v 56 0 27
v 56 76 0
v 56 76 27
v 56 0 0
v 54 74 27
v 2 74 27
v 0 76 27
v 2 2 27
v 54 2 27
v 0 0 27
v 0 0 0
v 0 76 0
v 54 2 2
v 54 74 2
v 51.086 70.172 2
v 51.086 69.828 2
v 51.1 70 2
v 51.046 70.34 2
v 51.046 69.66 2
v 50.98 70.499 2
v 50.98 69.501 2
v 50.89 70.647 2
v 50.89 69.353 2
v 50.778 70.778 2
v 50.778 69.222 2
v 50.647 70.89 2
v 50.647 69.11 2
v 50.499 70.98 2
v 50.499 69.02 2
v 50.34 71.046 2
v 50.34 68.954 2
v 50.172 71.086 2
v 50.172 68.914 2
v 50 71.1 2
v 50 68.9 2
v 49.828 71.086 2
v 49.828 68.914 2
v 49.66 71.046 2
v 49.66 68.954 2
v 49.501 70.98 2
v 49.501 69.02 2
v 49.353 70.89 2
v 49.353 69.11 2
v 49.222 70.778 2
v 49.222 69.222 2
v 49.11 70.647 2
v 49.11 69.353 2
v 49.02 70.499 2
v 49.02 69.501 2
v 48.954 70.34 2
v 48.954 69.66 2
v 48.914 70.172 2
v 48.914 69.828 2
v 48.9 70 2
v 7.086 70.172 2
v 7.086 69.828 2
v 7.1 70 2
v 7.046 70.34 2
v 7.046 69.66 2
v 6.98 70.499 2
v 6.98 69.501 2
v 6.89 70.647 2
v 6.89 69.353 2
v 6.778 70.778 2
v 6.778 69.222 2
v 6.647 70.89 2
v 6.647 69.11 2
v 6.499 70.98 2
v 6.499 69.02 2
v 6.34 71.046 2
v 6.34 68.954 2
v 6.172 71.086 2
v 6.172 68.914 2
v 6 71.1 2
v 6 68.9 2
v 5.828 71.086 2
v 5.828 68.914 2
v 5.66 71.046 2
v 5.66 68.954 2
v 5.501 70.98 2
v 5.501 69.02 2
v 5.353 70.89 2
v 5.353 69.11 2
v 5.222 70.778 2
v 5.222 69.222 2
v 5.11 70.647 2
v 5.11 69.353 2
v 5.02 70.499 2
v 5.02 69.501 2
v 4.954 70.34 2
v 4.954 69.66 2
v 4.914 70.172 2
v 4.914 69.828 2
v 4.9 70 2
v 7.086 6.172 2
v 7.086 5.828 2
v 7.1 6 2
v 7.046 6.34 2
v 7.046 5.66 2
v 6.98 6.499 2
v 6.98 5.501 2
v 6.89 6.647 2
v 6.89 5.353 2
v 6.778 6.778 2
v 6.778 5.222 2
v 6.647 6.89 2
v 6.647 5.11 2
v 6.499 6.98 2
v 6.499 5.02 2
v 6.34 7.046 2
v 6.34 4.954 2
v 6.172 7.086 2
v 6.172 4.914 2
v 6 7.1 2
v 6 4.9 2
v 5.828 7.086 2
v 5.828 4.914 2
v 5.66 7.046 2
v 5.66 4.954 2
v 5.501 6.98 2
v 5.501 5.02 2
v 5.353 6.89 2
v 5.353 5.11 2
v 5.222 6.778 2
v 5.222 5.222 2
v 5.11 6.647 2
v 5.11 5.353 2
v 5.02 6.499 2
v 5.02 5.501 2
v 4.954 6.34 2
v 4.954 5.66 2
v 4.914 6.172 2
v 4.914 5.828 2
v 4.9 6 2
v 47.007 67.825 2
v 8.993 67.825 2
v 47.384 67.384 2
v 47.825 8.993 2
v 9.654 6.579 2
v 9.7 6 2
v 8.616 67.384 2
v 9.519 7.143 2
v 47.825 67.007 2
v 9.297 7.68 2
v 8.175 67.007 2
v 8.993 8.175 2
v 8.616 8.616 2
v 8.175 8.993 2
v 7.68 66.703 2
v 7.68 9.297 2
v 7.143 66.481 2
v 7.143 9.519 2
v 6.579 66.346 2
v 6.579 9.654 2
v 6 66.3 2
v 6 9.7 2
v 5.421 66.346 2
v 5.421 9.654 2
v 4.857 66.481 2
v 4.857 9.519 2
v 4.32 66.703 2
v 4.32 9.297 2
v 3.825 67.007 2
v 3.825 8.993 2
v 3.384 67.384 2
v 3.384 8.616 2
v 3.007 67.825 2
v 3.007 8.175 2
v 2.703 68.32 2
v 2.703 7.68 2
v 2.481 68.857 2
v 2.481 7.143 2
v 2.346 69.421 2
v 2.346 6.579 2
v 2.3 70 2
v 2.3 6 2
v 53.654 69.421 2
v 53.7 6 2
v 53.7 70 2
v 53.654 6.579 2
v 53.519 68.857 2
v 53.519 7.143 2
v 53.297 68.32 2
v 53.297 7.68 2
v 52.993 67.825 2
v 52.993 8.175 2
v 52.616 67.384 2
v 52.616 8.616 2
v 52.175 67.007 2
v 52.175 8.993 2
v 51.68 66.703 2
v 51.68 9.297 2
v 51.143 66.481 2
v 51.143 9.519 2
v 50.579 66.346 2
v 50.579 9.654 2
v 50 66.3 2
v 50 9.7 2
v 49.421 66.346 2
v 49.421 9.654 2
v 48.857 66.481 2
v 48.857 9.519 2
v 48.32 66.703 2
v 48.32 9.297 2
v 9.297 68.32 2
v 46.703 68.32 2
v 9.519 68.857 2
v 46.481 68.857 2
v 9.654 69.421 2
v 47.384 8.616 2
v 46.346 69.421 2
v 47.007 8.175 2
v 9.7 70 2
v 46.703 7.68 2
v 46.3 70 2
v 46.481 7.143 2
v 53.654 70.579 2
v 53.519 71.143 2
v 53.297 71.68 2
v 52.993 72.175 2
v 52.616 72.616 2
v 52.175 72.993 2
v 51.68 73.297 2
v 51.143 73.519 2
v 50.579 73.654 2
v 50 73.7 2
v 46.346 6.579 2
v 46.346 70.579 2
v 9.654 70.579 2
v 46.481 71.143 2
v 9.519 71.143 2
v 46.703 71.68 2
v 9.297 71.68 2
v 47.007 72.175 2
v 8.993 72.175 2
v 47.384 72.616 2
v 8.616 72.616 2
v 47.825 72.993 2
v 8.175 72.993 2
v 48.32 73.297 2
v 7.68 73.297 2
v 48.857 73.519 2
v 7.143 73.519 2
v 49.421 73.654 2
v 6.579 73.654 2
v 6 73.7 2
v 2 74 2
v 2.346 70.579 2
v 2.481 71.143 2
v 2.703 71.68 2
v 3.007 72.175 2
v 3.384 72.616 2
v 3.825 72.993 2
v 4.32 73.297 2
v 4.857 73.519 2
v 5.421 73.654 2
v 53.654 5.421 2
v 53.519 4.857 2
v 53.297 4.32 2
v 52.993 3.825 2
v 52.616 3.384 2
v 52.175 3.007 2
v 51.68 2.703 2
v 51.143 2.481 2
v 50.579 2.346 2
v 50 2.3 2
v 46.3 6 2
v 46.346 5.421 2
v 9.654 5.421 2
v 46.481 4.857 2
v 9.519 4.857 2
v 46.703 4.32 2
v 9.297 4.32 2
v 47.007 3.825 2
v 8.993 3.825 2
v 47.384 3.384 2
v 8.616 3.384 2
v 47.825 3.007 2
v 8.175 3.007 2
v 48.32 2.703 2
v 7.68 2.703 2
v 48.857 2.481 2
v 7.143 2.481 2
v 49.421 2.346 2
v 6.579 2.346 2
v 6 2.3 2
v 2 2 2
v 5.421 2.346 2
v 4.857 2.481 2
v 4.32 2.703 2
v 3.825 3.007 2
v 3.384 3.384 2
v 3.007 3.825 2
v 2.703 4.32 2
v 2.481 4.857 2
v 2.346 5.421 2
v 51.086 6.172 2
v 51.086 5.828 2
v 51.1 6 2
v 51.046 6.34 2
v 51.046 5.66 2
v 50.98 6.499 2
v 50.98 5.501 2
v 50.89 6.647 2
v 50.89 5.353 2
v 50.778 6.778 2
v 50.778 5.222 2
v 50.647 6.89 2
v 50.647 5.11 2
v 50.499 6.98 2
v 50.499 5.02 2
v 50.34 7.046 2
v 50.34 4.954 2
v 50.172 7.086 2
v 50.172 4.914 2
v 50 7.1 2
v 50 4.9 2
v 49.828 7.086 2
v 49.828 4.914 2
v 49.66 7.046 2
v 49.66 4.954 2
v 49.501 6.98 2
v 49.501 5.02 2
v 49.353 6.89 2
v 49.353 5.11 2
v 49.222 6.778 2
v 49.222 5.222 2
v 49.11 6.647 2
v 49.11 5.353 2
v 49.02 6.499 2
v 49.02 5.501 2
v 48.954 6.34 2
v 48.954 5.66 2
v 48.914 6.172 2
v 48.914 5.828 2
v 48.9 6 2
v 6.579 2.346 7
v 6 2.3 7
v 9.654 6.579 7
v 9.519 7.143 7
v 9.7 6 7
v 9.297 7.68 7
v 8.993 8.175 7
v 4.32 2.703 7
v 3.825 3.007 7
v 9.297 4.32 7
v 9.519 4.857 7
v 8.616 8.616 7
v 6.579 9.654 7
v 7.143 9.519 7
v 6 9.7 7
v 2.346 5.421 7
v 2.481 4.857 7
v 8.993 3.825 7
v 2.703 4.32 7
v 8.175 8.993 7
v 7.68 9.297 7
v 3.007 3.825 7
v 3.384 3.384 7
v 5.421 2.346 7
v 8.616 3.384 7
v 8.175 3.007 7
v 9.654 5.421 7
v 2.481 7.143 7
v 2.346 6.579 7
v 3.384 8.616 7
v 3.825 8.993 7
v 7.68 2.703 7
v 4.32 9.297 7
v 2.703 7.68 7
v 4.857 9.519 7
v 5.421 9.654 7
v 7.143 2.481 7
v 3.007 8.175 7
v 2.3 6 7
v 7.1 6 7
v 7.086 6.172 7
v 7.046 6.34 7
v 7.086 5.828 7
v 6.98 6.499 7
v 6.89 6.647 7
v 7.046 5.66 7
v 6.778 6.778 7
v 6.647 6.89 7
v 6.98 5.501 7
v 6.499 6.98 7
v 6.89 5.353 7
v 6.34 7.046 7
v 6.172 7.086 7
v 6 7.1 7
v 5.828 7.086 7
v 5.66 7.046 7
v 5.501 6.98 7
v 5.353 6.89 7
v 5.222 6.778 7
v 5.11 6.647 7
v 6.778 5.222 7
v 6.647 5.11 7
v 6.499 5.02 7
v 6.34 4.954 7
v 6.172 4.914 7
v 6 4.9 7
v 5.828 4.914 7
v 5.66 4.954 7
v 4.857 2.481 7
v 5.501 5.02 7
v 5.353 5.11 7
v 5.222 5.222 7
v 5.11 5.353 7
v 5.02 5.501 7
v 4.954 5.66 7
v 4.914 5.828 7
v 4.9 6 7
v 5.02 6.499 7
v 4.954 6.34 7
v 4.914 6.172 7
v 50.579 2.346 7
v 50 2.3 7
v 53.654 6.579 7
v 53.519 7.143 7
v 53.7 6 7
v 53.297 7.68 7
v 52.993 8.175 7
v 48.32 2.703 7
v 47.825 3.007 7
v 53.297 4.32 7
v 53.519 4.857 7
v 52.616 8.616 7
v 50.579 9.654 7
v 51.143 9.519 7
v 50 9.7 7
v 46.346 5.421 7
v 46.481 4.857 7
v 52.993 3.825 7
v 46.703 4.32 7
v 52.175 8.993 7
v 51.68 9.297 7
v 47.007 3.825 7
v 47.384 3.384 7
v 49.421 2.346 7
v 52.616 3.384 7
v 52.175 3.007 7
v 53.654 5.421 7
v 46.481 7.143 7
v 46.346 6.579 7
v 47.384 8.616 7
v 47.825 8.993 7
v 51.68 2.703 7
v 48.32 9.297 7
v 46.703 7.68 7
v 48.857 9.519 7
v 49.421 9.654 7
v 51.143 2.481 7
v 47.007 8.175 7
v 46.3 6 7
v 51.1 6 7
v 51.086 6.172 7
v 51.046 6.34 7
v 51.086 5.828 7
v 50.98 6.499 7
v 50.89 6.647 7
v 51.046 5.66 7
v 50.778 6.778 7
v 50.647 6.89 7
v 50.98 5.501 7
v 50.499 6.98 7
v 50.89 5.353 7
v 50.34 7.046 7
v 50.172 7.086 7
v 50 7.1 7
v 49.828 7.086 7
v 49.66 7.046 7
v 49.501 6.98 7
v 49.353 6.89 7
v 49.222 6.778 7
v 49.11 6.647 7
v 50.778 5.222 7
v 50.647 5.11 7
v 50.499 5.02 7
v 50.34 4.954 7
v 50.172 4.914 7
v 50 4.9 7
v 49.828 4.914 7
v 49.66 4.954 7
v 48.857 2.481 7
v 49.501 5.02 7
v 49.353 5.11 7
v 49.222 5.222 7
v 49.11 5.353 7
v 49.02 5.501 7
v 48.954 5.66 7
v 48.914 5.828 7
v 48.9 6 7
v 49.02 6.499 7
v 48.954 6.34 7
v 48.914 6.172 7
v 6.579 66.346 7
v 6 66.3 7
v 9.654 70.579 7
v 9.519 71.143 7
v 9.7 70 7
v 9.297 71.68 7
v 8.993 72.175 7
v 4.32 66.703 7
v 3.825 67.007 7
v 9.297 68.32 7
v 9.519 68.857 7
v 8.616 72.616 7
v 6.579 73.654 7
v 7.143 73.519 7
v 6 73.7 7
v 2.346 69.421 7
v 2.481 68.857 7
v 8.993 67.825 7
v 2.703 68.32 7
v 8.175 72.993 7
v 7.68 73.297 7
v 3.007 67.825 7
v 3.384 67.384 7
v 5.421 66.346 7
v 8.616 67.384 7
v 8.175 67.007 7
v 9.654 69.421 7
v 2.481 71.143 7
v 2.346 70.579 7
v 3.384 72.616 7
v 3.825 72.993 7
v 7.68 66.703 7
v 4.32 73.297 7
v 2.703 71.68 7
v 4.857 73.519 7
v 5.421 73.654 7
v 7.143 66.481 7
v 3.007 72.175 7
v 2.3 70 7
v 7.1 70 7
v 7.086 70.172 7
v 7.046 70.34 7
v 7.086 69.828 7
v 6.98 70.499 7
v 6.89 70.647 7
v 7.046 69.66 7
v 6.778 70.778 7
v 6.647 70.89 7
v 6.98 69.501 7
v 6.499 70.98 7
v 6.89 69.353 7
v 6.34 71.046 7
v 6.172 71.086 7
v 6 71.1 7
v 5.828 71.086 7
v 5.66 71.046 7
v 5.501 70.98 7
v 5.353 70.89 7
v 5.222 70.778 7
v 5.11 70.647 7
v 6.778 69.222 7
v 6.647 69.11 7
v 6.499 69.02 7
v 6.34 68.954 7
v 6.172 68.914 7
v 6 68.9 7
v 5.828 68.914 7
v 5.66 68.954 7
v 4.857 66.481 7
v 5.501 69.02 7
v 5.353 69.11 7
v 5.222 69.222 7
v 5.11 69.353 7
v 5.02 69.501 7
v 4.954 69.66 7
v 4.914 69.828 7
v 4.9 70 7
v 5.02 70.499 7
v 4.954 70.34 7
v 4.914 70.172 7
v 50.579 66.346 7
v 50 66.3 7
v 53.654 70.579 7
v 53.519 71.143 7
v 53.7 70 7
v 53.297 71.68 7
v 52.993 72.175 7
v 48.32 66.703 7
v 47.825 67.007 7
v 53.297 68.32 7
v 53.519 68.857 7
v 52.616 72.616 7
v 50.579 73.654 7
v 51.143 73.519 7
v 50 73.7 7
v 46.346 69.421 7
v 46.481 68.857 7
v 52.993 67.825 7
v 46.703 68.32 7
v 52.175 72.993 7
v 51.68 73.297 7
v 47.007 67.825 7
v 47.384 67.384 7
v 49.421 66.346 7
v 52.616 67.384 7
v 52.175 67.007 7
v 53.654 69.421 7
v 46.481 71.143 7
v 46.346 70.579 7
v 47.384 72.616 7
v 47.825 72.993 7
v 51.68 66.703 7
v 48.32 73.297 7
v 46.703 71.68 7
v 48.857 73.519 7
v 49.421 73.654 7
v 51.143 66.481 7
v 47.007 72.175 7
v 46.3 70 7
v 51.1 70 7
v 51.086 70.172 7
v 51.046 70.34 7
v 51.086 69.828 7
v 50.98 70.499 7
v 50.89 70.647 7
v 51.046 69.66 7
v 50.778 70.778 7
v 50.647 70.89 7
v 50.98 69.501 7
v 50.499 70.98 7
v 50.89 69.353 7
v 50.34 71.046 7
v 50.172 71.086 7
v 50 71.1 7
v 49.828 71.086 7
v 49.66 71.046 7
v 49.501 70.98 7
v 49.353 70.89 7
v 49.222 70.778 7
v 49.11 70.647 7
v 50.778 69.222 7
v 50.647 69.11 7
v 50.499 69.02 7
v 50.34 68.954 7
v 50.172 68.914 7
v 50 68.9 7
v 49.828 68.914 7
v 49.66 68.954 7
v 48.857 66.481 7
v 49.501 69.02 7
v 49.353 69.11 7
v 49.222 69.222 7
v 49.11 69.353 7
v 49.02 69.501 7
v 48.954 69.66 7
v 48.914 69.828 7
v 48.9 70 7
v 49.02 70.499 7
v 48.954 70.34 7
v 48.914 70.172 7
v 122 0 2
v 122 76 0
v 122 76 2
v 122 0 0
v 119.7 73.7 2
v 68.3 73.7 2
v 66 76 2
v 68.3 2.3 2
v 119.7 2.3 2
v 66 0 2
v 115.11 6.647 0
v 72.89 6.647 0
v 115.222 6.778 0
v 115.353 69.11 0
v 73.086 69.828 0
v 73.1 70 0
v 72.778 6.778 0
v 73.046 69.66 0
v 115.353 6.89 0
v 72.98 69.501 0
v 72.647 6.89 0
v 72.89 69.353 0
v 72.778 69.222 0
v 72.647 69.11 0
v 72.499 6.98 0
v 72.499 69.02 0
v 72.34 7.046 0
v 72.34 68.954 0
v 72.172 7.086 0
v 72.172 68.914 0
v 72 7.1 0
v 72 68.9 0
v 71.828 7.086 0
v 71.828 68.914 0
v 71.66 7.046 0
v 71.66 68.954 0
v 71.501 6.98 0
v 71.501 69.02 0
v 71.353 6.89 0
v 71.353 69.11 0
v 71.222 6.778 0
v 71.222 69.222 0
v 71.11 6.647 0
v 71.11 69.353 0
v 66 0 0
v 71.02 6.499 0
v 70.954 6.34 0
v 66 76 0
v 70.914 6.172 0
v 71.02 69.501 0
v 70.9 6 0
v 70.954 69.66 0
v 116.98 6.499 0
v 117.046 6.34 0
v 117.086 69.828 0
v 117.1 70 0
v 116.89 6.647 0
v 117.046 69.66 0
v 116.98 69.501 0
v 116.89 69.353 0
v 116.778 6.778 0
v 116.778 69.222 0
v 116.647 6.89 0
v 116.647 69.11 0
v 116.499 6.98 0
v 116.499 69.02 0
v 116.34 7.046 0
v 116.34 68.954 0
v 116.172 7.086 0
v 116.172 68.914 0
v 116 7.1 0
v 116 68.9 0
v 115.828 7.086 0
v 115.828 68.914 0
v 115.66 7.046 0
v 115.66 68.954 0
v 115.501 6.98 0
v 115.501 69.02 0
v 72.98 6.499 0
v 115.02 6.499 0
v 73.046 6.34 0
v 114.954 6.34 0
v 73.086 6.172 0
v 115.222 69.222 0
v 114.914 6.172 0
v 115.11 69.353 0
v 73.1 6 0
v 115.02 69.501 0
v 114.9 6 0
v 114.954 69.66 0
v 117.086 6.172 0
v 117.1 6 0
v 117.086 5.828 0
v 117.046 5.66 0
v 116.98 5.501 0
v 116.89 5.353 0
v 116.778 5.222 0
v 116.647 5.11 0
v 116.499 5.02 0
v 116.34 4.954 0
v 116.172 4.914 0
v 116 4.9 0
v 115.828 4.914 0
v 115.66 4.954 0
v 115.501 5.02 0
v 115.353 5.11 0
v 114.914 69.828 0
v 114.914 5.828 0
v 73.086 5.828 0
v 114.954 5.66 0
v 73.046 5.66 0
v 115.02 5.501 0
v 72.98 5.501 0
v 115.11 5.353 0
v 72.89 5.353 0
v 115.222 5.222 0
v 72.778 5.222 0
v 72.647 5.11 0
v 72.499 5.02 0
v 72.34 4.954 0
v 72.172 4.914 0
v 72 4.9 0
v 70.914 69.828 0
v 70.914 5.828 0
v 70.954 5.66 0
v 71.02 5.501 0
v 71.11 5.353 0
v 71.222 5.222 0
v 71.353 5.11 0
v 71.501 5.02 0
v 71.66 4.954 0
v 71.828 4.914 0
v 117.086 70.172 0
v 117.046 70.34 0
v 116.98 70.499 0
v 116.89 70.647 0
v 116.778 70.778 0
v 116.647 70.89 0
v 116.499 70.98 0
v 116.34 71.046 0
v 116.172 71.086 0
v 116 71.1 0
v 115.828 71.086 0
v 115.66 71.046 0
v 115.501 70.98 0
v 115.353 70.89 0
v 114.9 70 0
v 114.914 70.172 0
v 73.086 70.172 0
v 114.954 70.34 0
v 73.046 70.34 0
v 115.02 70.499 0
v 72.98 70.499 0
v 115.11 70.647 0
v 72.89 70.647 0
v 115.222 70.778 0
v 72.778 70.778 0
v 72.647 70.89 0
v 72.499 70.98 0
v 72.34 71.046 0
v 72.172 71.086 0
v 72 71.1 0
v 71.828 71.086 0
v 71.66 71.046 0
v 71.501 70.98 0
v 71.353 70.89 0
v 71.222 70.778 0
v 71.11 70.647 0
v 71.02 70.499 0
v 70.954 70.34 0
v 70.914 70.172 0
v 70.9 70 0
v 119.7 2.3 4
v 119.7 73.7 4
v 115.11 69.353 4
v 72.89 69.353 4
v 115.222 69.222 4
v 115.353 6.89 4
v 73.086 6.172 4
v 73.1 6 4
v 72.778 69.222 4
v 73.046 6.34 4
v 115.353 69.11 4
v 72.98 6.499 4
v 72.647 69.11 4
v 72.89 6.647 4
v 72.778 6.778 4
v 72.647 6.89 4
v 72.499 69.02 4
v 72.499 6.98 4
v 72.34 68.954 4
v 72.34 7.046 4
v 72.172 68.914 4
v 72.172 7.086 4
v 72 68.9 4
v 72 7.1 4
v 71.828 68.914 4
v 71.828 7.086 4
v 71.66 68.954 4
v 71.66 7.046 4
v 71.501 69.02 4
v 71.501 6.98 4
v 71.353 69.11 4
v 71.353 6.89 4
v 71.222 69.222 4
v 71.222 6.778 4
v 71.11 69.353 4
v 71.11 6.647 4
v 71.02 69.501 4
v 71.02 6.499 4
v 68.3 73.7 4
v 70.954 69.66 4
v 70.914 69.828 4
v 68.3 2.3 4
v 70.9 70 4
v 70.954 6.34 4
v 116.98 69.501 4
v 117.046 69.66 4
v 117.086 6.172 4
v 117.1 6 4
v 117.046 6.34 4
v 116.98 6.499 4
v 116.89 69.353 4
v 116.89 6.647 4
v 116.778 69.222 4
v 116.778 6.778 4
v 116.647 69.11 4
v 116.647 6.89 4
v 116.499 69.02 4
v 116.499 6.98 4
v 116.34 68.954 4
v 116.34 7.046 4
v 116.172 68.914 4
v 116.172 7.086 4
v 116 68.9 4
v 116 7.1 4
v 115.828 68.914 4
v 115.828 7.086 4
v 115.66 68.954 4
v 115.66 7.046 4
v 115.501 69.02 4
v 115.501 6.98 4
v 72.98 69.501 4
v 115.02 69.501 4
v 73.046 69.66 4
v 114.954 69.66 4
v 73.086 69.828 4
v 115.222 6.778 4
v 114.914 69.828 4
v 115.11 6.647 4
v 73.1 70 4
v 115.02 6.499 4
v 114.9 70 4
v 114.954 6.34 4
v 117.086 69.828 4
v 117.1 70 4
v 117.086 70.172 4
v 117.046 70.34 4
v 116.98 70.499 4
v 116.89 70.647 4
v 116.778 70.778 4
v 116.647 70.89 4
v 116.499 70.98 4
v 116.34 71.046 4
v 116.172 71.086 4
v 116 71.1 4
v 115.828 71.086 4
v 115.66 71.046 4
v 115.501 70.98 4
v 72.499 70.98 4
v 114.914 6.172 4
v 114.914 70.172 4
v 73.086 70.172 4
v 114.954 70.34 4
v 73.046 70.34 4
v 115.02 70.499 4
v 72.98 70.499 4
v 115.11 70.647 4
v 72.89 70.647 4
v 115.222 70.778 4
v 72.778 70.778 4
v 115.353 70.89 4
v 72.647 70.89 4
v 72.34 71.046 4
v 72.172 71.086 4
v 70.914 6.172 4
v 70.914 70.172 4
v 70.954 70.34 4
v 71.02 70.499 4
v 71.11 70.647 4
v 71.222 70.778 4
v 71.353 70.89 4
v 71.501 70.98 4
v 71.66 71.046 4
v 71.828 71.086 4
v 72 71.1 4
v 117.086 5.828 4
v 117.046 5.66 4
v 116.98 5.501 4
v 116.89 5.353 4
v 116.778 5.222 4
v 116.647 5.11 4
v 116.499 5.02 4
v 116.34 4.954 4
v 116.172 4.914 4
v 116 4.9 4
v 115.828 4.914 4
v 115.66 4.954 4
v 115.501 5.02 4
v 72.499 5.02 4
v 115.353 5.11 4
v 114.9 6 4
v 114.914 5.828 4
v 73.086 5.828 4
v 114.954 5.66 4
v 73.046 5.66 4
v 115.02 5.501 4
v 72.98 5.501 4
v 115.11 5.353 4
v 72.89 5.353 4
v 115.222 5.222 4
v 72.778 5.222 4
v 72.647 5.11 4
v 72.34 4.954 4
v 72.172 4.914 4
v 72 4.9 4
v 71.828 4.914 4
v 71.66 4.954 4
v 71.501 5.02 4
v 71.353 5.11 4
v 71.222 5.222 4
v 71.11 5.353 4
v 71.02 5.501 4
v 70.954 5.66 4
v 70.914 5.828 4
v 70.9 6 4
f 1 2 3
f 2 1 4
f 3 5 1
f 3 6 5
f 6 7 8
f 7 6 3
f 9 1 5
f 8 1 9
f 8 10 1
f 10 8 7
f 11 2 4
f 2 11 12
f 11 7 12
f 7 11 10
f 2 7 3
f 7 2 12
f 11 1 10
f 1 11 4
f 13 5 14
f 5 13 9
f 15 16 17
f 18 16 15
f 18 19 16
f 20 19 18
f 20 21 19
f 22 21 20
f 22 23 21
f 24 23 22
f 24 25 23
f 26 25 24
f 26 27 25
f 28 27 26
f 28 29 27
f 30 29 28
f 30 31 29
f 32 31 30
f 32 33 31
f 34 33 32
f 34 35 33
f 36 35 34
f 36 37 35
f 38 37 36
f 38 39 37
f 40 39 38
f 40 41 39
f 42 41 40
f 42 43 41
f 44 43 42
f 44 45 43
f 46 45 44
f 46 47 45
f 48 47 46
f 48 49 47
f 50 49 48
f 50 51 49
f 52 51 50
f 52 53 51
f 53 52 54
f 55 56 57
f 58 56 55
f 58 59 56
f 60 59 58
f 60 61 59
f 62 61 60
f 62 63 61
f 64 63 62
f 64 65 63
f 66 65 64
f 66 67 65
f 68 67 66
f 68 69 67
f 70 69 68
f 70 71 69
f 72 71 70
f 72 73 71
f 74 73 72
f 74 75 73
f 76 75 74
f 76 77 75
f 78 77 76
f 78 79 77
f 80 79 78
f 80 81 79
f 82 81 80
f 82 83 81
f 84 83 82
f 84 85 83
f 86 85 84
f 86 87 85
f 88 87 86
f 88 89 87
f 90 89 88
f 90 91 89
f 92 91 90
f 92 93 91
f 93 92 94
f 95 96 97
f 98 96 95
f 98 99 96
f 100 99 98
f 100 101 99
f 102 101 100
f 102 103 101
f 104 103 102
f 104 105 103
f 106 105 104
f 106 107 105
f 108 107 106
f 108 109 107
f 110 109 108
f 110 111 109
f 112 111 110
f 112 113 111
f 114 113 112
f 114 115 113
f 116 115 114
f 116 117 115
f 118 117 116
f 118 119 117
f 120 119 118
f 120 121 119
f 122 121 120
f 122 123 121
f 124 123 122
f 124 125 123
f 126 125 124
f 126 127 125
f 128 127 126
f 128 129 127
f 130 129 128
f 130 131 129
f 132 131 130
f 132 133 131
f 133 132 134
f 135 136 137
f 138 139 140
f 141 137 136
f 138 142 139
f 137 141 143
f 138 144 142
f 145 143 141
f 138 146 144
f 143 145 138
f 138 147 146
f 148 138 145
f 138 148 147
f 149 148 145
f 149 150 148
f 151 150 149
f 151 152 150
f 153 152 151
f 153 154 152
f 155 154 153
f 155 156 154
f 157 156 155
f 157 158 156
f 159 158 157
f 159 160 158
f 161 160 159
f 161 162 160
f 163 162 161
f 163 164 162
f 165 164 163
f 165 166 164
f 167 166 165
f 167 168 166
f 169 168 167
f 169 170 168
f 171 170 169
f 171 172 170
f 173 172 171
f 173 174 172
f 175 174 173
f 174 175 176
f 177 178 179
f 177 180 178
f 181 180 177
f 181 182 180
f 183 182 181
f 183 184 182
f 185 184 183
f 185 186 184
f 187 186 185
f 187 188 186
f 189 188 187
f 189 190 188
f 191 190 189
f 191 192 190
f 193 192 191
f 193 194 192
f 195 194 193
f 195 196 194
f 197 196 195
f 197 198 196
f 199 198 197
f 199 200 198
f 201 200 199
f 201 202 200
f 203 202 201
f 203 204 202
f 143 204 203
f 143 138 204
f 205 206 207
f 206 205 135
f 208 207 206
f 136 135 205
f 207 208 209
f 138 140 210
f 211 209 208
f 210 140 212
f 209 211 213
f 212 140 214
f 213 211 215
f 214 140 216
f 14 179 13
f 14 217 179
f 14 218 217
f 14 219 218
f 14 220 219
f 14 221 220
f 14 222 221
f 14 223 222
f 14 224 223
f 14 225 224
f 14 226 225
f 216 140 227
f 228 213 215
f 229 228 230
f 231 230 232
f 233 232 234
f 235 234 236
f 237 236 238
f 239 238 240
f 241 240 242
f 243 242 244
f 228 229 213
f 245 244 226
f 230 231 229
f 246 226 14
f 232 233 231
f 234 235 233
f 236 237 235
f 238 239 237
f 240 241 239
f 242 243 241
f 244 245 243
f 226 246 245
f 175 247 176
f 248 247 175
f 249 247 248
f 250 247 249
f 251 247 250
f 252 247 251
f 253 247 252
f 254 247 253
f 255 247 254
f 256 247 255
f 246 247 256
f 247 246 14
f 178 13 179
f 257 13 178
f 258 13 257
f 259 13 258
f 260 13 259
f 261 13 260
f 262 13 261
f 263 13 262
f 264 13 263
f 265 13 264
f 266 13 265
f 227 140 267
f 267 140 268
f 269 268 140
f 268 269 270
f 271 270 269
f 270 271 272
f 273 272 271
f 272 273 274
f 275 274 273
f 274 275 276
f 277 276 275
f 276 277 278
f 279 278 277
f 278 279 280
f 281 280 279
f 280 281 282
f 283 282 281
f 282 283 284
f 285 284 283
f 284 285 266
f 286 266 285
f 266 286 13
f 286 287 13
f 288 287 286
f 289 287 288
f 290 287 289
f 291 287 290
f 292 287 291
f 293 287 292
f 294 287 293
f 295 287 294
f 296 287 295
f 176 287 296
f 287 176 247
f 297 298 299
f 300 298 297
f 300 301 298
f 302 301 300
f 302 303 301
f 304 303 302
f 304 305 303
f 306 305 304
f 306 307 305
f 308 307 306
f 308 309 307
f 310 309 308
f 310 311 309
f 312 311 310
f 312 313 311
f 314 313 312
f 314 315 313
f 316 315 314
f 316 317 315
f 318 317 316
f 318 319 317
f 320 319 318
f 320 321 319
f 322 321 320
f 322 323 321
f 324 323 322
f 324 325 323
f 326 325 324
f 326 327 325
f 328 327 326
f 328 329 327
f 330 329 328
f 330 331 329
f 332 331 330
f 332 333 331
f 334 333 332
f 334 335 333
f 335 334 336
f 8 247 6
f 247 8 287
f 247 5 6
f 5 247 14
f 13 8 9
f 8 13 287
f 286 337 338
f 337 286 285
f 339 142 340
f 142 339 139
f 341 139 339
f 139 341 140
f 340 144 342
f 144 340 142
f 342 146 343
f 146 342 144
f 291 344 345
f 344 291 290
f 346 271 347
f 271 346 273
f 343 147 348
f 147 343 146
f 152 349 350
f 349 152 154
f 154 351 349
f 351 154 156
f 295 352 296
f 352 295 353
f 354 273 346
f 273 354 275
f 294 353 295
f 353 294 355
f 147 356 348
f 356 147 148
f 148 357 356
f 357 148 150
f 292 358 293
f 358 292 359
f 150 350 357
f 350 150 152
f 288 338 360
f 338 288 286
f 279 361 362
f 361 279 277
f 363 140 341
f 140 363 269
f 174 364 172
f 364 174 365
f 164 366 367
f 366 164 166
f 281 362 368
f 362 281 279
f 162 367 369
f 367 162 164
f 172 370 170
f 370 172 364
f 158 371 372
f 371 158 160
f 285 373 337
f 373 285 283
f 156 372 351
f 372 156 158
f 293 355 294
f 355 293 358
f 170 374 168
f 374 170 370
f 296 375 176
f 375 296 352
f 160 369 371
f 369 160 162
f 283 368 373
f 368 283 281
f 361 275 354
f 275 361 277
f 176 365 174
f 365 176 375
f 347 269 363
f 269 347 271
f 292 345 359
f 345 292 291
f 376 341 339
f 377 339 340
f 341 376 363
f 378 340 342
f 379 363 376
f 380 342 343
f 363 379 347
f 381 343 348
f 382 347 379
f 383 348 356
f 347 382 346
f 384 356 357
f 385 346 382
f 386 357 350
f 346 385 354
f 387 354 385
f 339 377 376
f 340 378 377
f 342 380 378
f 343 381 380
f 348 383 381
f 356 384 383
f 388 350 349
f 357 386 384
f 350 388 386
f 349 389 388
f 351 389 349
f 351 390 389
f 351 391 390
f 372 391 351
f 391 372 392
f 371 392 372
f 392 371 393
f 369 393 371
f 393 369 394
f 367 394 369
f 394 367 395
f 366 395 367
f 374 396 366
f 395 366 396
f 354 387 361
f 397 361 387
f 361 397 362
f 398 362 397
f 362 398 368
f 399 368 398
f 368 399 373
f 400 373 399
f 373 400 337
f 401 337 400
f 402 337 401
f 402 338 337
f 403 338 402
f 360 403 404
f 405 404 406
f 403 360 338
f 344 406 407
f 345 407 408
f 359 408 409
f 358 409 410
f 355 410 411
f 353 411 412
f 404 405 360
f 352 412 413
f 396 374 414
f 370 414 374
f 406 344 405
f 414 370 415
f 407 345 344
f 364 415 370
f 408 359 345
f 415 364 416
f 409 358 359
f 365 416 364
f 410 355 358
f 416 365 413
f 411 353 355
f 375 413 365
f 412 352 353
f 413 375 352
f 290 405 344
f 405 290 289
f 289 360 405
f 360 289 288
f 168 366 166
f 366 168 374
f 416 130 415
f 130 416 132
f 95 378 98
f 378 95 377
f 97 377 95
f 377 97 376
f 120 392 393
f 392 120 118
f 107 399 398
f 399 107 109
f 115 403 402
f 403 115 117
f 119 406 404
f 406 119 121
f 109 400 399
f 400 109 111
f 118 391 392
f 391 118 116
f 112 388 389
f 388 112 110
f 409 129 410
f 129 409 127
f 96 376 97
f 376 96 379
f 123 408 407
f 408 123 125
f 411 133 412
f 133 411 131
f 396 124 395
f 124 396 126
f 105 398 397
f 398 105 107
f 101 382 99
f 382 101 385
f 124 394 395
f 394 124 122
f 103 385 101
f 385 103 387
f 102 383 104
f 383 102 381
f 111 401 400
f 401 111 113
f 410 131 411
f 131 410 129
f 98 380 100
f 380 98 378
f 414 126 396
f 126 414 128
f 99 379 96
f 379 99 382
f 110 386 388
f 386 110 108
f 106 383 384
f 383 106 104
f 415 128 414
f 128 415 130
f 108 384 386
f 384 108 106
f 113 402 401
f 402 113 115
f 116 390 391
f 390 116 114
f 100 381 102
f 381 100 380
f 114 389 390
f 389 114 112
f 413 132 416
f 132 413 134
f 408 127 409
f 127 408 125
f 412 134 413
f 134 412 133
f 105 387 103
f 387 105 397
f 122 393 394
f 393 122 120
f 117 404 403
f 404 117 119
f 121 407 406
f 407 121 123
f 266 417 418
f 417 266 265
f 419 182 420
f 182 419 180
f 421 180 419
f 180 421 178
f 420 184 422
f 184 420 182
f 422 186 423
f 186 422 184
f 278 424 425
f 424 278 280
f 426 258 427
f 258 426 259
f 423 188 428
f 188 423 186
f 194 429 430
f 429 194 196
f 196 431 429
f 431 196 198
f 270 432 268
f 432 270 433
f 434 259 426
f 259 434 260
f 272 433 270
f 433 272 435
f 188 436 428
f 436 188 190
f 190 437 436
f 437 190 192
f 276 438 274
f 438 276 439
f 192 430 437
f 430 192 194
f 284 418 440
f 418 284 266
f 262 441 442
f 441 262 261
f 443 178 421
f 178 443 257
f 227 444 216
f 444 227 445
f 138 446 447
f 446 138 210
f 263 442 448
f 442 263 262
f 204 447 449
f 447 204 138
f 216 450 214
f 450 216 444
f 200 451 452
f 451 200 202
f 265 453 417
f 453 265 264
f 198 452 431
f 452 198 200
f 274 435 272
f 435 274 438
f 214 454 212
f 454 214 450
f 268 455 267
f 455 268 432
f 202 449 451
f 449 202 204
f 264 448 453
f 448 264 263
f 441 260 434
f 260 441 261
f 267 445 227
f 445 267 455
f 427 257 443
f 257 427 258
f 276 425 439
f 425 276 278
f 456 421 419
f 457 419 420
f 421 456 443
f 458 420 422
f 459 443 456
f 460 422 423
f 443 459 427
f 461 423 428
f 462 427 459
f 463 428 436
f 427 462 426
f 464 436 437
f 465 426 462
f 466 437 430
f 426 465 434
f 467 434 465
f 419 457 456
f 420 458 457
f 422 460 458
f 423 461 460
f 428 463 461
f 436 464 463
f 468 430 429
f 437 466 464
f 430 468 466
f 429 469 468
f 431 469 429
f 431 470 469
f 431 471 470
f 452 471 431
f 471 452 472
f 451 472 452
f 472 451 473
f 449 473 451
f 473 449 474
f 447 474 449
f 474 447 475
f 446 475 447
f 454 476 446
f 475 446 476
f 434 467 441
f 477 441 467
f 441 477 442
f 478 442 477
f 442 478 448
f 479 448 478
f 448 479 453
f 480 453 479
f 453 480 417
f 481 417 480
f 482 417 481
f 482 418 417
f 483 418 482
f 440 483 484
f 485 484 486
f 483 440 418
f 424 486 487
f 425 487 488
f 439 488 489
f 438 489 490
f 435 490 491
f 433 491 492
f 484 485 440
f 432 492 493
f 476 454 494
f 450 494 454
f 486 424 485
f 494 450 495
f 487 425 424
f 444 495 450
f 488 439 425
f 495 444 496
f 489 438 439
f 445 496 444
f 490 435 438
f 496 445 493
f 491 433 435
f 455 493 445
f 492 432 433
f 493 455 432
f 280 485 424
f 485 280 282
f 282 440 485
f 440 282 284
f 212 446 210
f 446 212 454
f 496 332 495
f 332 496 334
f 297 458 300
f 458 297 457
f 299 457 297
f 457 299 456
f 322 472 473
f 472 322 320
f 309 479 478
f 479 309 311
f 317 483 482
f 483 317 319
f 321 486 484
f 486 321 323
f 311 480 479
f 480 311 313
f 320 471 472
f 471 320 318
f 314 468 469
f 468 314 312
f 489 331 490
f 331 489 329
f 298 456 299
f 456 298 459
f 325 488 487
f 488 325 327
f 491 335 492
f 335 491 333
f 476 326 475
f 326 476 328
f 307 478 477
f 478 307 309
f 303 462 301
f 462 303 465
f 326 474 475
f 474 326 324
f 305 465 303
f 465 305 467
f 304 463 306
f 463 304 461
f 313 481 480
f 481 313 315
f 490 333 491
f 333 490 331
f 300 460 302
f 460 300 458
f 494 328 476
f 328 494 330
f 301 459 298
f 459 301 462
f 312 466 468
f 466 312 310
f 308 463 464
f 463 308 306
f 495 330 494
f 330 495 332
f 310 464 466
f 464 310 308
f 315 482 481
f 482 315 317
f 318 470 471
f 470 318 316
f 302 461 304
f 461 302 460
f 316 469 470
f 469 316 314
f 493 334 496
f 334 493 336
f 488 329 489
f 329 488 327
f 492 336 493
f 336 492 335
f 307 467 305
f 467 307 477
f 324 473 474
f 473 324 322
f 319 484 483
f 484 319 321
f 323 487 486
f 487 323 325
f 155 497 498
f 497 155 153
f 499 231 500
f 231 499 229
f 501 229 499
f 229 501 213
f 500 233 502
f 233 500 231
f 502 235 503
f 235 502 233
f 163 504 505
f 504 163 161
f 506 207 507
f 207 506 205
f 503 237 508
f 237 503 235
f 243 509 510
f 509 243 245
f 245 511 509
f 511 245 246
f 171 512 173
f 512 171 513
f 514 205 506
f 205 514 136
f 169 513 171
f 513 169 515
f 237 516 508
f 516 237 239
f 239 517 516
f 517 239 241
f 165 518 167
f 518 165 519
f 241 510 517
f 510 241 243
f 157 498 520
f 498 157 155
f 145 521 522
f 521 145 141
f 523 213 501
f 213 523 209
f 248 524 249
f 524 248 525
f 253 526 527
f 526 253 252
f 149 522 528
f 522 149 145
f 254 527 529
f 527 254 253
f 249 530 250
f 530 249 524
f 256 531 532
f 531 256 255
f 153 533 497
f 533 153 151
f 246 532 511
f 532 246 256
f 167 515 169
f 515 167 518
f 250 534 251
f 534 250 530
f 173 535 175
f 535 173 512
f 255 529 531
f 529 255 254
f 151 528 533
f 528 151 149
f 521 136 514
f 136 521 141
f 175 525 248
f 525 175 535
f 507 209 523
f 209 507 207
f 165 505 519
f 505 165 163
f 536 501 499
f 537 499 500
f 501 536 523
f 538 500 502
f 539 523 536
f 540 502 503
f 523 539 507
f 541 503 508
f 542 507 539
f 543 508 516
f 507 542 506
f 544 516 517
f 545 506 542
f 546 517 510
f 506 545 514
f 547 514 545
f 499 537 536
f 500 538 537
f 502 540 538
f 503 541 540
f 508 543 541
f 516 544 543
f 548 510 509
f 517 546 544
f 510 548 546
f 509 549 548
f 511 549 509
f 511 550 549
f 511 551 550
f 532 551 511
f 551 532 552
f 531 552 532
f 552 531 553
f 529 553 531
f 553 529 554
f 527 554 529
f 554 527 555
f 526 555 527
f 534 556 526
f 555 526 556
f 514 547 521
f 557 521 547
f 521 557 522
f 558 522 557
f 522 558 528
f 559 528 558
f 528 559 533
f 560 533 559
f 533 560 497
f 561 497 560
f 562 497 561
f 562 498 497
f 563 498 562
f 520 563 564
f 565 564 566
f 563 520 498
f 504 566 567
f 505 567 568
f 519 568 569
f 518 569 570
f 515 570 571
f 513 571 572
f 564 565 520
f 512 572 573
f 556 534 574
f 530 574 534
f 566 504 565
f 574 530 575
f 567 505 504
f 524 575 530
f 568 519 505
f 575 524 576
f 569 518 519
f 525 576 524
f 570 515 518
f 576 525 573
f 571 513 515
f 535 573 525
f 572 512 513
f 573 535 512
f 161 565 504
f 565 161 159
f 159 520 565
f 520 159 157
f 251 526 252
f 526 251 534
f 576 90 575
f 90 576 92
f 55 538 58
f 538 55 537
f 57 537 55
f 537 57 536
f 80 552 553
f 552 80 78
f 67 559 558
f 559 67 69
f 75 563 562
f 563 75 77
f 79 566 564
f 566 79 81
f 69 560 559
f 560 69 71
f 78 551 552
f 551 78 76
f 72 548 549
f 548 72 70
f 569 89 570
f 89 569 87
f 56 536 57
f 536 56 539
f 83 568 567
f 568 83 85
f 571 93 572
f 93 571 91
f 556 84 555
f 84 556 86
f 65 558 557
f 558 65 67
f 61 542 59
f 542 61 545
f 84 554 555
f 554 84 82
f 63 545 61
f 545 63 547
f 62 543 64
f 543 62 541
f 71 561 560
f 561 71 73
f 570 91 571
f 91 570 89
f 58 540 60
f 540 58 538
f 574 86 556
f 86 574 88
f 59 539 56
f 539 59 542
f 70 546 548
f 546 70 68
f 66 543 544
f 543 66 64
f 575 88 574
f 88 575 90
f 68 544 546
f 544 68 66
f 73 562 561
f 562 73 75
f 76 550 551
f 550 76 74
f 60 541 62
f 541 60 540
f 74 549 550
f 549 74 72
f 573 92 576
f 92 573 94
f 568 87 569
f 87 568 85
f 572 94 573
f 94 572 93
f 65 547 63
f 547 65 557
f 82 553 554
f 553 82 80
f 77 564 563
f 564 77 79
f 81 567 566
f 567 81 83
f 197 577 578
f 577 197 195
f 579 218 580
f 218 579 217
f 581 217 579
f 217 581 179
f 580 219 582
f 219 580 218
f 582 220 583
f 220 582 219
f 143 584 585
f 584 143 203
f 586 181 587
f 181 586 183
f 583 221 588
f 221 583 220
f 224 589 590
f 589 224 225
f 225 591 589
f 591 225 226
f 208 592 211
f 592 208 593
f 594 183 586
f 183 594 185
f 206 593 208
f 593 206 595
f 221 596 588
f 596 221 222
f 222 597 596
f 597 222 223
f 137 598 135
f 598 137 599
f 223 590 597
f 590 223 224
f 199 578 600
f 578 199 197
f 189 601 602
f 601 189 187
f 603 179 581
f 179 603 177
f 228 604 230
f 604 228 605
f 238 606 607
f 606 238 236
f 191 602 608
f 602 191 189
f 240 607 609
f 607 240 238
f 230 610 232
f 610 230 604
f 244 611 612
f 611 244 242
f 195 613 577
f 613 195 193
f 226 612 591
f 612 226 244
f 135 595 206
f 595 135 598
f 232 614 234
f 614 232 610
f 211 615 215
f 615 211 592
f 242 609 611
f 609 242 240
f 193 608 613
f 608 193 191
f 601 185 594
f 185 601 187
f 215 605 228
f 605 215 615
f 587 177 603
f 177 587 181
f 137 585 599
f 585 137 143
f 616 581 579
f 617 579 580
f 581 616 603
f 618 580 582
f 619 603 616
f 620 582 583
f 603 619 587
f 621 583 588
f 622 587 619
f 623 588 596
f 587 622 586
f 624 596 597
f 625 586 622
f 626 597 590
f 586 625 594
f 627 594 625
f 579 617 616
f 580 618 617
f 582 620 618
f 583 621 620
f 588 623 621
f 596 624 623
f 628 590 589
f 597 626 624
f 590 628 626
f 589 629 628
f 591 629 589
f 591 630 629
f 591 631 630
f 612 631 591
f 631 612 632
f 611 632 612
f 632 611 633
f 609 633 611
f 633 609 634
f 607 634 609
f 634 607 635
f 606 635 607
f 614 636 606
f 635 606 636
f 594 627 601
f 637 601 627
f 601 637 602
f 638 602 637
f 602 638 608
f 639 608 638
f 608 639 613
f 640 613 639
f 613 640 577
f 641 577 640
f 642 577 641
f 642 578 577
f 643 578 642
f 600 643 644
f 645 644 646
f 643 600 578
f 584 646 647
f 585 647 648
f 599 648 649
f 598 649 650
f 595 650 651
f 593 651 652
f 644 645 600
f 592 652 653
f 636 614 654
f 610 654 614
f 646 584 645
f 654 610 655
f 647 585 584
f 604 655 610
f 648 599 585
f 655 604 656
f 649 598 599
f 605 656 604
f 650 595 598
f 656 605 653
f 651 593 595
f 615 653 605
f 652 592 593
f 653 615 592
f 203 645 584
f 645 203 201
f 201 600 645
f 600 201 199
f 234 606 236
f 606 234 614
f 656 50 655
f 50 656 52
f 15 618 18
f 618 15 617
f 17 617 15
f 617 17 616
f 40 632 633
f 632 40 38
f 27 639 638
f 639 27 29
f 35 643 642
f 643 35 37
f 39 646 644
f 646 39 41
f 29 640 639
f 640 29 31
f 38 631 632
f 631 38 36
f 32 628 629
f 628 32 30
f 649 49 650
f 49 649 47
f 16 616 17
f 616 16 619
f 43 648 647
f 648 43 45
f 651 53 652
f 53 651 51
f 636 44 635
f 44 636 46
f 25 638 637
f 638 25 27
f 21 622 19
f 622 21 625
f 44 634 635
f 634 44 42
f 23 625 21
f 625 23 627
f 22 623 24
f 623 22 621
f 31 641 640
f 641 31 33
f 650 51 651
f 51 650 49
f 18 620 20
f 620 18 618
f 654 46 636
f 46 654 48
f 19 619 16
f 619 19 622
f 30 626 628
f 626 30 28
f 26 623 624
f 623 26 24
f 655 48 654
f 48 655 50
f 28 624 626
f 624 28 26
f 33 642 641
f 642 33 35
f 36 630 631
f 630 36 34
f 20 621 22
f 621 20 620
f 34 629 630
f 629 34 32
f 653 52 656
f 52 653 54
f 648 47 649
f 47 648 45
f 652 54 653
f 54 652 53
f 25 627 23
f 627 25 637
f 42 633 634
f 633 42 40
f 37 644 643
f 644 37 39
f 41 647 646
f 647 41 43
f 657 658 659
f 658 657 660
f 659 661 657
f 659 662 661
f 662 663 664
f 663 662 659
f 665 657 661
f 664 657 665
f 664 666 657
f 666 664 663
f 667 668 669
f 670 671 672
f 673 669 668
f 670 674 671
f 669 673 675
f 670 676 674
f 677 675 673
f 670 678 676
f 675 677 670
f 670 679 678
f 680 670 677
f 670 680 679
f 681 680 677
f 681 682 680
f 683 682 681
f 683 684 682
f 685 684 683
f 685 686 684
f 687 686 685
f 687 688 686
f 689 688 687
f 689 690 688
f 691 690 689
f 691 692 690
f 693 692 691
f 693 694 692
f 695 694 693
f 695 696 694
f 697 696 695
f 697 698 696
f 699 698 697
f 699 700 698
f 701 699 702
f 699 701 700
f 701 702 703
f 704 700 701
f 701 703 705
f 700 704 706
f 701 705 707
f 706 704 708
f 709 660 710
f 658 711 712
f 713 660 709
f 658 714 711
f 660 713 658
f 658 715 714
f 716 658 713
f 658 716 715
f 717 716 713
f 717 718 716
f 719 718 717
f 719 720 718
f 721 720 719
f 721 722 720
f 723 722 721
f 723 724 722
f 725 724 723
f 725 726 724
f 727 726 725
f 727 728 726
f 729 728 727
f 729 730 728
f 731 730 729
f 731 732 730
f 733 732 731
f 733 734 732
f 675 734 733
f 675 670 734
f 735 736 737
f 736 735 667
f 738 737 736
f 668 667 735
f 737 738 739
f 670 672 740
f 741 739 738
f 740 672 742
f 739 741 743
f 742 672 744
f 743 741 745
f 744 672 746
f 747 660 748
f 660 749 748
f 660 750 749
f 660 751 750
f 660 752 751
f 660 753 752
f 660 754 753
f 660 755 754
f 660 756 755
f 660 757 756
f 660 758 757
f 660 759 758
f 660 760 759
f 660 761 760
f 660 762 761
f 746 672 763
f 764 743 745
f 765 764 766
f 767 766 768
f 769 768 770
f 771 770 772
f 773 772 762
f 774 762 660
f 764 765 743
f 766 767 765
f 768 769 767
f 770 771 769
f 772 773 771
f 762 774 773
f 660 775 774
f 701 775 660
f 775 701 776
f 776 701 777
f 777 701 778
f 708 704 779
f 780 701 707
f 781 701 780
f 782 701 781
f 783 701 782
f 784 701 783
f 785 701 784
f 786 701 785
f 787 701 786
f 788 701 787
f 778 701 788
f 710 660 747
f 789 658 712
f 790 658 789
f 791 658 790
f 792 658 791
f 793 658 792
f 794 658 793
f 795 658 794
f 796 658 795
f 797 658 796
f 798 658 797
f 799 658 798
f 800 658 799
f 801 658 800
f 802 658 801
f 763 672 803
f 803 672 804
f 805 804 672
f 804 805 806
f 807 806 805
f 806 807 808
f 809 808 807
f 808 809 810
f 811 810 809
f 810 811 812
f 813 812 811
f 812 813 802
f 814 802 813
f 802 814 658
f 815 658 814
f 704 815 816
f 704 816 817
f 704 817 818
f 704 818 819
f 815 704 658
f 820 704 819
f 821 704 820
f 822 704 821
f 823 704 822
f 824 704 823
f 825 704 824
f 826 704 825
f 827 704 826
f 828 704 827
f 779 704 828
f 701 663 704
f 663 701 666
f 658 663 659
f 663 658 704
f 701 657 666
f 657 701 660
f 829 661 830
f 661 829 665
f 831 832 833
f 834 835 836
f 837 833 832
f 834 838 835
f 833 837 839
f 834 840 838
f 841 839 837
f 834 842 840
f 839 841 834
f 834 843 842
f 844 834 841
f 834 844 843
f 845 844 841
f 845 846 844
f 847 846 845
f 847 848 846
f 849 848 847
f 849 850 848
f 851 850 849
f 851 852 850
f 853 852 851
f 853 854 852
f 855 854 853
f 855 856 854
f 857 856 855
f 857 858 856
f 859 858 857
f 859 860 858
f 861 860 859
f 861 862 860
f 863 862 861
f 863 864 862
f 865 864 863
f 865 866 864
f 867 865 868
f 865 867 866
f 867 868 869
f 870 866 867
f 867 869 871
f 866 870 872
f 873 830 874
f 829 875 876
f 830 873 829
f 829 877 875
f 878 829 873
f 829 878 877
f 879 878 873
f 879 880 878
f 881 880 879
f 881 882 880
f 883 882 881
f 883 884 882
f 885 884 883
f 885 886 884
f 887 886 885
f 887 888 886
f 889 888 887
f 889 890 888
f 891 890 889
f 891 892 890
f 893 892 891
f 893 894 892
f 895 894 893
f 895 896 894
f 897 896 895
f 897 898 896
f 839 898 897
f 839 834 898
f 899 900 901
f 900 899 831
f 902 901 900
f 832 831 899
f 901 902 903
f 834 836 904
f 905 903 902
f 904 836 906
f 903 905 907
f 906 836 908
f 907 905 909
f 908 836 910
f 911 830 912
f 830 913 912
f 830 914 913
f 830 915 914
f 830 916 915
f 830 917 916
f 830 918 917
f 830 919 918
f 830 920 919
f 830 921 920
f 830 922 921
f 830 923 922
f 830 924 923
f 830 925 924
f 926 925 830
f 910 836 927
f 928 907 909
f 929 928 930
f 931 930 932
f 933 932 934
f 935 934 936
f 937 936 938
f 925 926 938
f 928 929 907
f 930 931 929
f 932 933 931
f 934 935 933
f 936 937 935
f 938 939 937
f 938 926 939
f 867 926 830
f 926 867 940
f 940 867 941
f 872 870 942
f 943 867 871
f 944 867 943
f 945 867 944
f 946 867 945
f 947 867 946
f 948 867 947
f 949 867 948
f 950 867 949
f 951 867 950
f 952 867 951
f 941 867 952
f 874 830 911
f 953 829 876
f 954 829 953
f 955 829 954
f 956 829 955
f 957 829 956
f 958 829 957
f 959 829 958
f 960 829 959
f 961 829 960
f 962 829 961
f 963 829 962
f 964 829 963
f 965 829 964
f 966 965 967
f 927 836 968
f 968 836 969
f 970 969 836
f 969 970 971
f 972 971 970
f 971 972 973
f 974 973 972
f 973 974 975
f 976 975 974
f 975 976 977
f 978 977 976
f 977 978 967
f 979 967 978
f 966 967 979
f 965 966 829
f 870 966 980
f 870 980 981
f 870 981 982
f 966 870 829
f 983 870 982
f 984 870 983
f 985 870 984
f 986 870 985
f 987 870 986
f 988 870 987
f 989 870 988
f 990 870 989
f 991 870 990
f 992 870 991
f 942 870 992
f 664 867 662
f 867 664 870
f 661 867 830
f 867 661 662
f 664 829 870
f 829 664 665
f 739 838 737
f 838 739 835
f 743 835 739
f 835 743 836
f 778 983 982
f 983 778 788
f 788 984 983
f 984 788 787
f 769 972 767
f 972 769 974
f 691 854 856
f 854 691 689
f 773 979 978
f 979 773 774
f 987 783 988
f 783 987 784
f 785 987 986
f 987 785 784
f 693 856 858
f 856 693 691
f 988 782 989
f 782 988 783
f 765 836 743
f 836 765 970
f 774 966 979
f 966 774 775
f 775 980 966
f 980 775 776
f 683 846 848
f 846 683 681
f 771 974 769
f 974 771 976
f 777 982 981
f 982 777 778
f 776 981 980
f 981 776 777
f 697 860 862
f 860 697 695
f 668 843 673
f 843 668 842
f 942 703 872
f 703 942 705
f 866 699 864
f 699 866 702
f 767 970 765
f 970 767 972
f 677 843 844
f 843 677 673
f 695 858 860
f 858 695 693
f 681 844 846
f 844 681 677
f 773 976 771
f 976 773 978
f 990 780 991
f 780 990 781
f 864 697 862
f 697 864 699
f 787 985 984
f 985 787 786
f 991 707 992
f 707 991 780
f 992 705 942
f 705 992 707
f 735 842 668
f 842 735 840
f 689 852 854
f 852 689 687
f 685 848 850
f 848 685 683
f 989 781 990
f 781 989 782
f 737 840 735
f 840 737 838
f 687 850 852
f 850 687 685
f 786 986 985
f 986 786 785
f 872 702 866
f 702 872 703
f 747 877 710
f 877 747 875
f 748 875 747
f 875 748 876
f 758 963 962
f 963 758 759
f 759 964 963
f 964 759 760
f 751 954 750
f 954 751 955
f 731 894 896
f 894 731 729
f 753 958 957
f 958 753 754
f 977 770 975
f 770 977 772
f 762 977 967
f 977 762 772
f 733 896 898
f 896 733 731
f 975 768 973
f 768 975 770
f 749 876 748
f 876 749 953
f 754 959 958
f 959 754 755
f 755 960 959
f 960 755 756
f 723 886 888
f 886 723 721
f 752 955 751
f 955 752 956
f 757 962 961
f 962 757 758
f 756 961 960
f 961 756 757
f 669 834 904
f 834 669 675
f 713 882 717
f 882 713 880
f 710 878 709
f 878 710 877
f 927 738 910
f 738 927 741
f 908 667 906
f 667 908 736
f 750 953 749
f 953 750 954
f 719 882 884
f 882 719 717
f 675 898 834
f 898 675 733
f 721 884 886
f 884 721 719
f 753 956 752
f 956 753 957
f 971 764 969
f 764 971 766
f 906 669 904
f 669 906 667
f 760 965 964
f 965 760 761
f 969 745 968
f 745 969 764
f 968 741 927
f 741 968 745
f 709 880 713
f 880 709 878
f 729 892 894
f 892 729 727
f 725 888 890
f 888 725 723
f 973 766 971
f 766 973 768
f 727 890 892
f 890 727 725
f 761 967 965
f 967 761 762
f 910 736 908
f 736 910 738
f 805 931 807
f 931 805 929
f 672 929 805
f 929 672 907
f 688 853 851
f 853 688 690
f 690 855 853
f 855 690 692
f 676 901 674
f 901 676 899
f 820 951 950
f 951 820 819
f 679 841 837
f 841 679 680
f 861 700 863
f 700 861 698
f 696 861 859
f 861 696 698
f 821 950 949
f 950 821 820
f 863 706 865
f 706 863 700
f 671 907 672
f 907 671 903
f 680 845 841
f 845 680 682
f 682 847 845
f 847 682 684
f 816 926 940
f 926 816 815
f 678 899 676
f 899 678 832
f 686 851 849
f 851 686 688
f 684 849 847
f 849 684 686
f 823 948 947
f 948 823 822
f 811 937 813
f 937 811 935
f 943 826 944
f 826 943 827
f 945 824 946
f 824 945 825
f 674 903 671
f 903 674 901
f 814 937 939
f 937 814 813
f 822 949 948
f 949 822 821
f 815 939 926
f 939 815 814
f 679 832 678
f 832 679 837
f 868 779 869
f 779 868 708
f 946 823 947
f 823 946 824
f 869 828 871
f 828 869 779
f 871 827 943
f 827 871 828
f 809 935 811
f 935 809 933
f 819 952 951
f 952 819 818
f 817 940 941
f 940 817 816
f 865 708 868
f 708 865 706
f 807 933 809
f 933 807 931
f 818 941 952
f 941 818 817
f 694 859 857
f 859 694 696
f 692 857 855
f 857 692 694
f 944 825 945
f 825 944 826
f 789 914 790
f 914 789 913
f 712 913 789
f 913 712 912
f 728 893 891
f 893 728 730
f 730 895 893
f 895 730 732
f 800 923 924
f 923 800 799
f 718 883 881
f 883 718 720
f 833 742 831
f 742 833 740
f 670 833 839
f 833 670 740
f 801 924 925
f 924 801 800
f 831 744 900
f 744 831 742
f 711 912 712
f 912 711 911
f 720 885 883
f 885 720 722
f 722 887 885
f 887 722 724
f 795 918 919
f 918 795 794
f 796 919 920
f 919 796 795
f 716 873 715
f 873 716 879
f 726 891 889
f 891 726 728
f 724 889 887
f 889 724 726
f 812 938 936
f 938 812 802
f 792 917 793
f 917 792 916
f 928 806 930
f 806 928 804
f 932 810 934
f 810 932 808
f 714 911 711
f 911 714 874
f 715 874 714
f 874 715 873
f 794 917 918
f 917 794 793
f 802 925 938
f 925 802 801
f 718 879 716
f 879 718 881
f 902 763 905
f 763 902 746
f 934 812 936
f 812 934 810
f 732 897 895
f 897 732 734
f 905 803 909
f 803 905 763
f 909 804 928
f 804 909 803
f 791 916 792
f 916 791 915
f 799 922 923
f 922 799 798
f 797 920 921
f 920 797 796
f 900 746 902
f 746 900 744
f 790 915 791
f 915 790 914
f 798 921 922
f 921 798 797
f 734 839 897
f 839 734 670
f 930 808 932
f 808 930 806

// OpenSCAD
// Parametric PCB Enclosure: test_box
// Generated automatically by Odysseus CAD Maker

$fn = 40;

pcb_w = 50.0;
pcb_l = 70.0;
box_h = 25.0;
wall = 2.0;
standoff_h = 5.0;
screw_d = 2.2;

outer_w = pcb_w + 2 * (wall + 1);
outer_l = pcb_l + 2 * (wall + 1);
outer_h = box_h + wall;

module standoff(x, y) {
    translate([x, y, wall]) {
        difference() {
            cylinder(r=screw_d + 1.5, h=standoff_h);
            cylinder(r=screw_d / 2, h=standoff_h + 1);
        }
    }
}

module enclosure_base() {
    difference() {
        // Outer body
        cube([outer_w, outer_l, outer_h]);
        // Inner cavity
        translate([wall, wall, wall])
            cube([outer_w - 2 * wall, outer_l - 2 * wall, outer_h]);
    }

    // PCB Standoffs in 4 corners
    standoff(wall + 4, wall + 4);
    standoff(outer_w - wall - 4, wall + 4);
    standoff(wall + 4, outer_l - wall - 4);
    standoff(outer_w - wall - 4, outer_l - wall - 4);
}

module enclosure_lid() {
    translate([outer_w + 10, 0, 0]) {
        difference() {
            union() {
                cube([outer_w, outer_l, wall]);
                translate([wall + 0.3, wall + 0.3, wall])
                    cube([outer_w - 2 * wall - 0.6, outer_l - 2 * wall - 0.6, 2]);
            }
            // Screw holes
            translate([wall + 4, wall + 4, -1]) cylinder(r=screw_d / 2, h=wall + 4);
            translate([outer_w - wall - 4, wall + 4, -1]) cylinder(r=screw_d / 2, h=wall + 4);
            translate([wall + 4, outer_l - wall - 4, -1]) cylinder(r=screw_d / 2, h=wall + 4);
            translate([outer_w - wall - 4, outer_l - wall - 4, -1]) cylinder(r=screw_d / 2, h=wall + 4);
        }
    }
}

enclosure_base();
enclosure_lid();
